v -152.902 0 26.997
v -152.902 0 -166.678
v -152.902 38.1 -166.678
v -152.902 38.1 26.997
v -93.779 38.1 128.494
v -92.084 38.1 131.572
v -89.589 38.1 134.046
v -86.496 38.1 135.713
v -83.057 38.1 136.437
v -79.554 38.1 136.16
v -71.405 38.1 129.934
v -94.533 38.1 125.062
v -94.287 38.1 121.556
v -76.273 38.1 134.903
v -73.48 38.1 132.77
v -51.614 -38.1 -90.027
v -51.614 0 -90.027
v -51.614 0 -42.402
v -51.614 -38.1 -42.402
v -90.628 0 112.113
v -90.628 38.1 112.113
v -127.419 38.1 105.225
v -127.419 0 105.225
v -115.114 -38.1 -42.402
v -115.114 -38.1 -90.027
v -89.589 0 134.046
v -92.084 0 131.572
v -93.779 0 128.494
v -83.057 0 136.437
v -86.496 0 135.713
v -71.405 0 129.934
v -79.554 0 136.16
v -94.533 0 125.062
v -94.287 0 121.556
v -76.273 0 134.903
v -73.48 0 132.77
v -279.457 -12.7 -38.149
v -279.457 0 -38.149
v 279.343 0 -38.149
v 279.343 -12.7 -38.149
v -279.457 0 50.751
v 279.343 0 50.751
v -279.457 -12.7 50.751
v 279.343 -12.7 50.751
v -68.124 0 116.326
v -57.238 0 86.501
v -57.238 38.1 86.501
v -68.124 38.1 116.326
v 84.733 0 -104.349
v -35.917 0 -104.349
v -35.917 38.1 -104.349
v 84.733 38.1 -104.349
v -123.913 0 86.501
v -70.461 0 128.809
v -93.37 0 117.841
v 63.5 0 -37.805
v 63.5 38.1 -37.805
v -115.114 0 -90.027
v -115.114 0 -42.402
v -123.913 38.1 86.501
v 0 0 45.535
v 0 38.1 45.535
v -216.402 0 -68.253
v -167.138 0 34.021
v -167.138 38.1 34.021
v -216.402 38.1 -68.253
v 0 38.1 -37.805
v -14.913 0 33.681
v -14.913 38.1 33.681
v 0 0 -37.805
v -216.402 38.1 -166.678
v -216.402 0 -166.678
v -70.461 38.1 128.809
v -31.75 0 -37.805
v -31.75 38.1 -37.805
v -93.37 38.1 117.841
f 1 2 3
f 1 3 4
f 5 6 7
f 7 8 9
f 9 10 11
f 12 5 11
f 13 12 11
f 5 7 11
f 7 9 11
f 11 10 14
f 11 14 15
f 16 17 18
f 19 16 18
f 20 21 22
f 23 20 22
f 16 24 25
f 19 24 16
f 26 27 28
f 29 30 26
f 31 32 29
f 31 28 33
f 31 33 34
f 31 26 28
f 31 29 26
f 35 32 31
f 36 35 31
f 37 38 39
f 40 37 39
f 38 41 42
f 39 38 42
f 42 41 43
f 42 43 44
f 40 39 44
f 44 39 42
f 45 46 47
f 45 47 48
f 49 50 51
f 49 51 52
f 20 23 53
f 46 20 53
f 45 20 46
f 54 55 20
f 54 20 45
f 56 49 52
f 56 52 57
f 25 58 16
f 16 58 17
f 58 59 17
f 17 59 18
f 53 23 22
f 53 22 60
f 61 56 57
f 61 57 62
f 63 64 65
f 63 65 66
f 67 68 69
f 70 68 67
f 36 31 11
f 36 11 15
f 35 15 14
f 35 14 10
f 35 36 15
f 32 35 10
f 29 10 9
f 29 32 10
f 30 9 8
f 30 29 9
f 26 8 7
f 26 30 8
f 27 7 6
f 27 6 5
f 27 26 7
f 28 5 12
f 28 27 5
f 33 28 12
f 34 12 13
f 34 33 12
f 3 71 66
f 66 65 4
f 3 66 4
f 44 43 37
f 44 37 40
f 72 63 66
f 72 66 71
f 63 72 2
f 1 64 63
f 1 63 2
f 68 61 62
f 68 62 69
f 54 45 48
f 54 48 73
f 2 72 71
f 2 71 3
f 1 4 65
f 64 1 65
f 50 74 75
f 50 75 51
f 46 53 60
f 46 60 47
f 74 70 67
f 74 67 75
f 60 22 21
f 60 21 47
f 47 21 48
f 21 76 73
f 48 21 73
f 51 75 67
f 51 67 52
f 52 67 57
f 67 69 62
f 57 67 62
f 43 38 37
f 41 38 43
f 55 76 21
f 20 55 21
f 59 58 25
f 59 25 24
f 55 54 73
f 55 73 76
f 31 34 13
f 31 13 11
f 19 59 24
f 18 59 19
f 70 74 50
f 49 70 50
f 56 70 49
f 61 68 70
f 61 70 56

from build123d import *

# Parameters (mm, degrees)
F1_DEPTH  = 38.1
F3_DEPTH  = 38.1
F5_DEPTH  = 38.1
F6_W      = 63.5
F6_H      = 47.625
F7_DEPTH  = 38.1
F9_DEPTH  = 38.1
F11_W     = 558.8
F11_H     = 88.9
F12_DEPTH = 12.7


with BuildPart() as f1:
    # F0 (on Front) → F1 (new body)
    with BuildSketch(Plane.XZ):
        Polygon((0, 45.535351), (-14.912687, 33.68148), (0, -37.80462), (63.5, -37.80462), align=None)
        Polygon((63.5, -37.80462), (0, -37.80462), (-31.75, -37.80462), (-35.917188, -104.349267), (84.732812, -104.349267), align=None)
    extrude(amount=-F1_DEPTH)


with BuildPart() as f3:
    # F2 (on Front) → F3 (new body)
    with BuildSketch(Plane.XZ):
        Polygon((-152.901755, 26.997404), (-167.138389, 34.021211), (-216.401755, -68.252596), (-216.401755, -166.677596), (-152.901755, -166.677596), align=None)
    extrude(amount=-F3_DEPTH)


with BuildPart() as f5:
    # F4 (on Front) → F5 (new body)
    with BuildSketch(Plane.XZ):
        Polygon((-90.628035, 112.113184), (-127.418593, 105.225444), (-123.913054, 86.500762), (-57.238054, 86.500762), (-68.123768, 116.326317), align=None)
        Polygon((-93.370257, 117.840549), (-90.628035, 112.113184), (-68.123768, 116.326317), (-70.460794, 128.809438), align=None)
    extrude(amount=-F5_DEPTH)


with BuildPart() as f7:
    # F6 (on Front) → F7 (new body)
    with BuildSketch(Plane.XZ):
        with Locations((-83.364229, -66.214131)):
            Rectangle(F6_W, F6_H)
    extrude(amount=F7_DEPTH)


with BuildPart() as f9:
    # F8 (on Front) → F9 (new body)
    with BuildSketch(Plane.XZ):
        with BuildLine():
            Line((-94.286829, 121.556476), (-71.405247, 129.934371))
            ThreePointArc((-71.405247, 129.934371), (-86.495535, 135.712876), (-94.286829, 121.556476))
        make_face()
    extrude(amount=-F9_DEPTH)


with BuildPart() as f12:
    # F11 (on Front) → F12 (new body)
    with BuildSketch(Plane.XZ):
        with Locations((-0.057161, 6.301109)):
            Rectangle(F11_W, F11_H)
    extrude(amount=F12_DEPTH)


solid = Compound([f1.part, f3.part, f5.part, f7.part, f9.part, f12.part])
